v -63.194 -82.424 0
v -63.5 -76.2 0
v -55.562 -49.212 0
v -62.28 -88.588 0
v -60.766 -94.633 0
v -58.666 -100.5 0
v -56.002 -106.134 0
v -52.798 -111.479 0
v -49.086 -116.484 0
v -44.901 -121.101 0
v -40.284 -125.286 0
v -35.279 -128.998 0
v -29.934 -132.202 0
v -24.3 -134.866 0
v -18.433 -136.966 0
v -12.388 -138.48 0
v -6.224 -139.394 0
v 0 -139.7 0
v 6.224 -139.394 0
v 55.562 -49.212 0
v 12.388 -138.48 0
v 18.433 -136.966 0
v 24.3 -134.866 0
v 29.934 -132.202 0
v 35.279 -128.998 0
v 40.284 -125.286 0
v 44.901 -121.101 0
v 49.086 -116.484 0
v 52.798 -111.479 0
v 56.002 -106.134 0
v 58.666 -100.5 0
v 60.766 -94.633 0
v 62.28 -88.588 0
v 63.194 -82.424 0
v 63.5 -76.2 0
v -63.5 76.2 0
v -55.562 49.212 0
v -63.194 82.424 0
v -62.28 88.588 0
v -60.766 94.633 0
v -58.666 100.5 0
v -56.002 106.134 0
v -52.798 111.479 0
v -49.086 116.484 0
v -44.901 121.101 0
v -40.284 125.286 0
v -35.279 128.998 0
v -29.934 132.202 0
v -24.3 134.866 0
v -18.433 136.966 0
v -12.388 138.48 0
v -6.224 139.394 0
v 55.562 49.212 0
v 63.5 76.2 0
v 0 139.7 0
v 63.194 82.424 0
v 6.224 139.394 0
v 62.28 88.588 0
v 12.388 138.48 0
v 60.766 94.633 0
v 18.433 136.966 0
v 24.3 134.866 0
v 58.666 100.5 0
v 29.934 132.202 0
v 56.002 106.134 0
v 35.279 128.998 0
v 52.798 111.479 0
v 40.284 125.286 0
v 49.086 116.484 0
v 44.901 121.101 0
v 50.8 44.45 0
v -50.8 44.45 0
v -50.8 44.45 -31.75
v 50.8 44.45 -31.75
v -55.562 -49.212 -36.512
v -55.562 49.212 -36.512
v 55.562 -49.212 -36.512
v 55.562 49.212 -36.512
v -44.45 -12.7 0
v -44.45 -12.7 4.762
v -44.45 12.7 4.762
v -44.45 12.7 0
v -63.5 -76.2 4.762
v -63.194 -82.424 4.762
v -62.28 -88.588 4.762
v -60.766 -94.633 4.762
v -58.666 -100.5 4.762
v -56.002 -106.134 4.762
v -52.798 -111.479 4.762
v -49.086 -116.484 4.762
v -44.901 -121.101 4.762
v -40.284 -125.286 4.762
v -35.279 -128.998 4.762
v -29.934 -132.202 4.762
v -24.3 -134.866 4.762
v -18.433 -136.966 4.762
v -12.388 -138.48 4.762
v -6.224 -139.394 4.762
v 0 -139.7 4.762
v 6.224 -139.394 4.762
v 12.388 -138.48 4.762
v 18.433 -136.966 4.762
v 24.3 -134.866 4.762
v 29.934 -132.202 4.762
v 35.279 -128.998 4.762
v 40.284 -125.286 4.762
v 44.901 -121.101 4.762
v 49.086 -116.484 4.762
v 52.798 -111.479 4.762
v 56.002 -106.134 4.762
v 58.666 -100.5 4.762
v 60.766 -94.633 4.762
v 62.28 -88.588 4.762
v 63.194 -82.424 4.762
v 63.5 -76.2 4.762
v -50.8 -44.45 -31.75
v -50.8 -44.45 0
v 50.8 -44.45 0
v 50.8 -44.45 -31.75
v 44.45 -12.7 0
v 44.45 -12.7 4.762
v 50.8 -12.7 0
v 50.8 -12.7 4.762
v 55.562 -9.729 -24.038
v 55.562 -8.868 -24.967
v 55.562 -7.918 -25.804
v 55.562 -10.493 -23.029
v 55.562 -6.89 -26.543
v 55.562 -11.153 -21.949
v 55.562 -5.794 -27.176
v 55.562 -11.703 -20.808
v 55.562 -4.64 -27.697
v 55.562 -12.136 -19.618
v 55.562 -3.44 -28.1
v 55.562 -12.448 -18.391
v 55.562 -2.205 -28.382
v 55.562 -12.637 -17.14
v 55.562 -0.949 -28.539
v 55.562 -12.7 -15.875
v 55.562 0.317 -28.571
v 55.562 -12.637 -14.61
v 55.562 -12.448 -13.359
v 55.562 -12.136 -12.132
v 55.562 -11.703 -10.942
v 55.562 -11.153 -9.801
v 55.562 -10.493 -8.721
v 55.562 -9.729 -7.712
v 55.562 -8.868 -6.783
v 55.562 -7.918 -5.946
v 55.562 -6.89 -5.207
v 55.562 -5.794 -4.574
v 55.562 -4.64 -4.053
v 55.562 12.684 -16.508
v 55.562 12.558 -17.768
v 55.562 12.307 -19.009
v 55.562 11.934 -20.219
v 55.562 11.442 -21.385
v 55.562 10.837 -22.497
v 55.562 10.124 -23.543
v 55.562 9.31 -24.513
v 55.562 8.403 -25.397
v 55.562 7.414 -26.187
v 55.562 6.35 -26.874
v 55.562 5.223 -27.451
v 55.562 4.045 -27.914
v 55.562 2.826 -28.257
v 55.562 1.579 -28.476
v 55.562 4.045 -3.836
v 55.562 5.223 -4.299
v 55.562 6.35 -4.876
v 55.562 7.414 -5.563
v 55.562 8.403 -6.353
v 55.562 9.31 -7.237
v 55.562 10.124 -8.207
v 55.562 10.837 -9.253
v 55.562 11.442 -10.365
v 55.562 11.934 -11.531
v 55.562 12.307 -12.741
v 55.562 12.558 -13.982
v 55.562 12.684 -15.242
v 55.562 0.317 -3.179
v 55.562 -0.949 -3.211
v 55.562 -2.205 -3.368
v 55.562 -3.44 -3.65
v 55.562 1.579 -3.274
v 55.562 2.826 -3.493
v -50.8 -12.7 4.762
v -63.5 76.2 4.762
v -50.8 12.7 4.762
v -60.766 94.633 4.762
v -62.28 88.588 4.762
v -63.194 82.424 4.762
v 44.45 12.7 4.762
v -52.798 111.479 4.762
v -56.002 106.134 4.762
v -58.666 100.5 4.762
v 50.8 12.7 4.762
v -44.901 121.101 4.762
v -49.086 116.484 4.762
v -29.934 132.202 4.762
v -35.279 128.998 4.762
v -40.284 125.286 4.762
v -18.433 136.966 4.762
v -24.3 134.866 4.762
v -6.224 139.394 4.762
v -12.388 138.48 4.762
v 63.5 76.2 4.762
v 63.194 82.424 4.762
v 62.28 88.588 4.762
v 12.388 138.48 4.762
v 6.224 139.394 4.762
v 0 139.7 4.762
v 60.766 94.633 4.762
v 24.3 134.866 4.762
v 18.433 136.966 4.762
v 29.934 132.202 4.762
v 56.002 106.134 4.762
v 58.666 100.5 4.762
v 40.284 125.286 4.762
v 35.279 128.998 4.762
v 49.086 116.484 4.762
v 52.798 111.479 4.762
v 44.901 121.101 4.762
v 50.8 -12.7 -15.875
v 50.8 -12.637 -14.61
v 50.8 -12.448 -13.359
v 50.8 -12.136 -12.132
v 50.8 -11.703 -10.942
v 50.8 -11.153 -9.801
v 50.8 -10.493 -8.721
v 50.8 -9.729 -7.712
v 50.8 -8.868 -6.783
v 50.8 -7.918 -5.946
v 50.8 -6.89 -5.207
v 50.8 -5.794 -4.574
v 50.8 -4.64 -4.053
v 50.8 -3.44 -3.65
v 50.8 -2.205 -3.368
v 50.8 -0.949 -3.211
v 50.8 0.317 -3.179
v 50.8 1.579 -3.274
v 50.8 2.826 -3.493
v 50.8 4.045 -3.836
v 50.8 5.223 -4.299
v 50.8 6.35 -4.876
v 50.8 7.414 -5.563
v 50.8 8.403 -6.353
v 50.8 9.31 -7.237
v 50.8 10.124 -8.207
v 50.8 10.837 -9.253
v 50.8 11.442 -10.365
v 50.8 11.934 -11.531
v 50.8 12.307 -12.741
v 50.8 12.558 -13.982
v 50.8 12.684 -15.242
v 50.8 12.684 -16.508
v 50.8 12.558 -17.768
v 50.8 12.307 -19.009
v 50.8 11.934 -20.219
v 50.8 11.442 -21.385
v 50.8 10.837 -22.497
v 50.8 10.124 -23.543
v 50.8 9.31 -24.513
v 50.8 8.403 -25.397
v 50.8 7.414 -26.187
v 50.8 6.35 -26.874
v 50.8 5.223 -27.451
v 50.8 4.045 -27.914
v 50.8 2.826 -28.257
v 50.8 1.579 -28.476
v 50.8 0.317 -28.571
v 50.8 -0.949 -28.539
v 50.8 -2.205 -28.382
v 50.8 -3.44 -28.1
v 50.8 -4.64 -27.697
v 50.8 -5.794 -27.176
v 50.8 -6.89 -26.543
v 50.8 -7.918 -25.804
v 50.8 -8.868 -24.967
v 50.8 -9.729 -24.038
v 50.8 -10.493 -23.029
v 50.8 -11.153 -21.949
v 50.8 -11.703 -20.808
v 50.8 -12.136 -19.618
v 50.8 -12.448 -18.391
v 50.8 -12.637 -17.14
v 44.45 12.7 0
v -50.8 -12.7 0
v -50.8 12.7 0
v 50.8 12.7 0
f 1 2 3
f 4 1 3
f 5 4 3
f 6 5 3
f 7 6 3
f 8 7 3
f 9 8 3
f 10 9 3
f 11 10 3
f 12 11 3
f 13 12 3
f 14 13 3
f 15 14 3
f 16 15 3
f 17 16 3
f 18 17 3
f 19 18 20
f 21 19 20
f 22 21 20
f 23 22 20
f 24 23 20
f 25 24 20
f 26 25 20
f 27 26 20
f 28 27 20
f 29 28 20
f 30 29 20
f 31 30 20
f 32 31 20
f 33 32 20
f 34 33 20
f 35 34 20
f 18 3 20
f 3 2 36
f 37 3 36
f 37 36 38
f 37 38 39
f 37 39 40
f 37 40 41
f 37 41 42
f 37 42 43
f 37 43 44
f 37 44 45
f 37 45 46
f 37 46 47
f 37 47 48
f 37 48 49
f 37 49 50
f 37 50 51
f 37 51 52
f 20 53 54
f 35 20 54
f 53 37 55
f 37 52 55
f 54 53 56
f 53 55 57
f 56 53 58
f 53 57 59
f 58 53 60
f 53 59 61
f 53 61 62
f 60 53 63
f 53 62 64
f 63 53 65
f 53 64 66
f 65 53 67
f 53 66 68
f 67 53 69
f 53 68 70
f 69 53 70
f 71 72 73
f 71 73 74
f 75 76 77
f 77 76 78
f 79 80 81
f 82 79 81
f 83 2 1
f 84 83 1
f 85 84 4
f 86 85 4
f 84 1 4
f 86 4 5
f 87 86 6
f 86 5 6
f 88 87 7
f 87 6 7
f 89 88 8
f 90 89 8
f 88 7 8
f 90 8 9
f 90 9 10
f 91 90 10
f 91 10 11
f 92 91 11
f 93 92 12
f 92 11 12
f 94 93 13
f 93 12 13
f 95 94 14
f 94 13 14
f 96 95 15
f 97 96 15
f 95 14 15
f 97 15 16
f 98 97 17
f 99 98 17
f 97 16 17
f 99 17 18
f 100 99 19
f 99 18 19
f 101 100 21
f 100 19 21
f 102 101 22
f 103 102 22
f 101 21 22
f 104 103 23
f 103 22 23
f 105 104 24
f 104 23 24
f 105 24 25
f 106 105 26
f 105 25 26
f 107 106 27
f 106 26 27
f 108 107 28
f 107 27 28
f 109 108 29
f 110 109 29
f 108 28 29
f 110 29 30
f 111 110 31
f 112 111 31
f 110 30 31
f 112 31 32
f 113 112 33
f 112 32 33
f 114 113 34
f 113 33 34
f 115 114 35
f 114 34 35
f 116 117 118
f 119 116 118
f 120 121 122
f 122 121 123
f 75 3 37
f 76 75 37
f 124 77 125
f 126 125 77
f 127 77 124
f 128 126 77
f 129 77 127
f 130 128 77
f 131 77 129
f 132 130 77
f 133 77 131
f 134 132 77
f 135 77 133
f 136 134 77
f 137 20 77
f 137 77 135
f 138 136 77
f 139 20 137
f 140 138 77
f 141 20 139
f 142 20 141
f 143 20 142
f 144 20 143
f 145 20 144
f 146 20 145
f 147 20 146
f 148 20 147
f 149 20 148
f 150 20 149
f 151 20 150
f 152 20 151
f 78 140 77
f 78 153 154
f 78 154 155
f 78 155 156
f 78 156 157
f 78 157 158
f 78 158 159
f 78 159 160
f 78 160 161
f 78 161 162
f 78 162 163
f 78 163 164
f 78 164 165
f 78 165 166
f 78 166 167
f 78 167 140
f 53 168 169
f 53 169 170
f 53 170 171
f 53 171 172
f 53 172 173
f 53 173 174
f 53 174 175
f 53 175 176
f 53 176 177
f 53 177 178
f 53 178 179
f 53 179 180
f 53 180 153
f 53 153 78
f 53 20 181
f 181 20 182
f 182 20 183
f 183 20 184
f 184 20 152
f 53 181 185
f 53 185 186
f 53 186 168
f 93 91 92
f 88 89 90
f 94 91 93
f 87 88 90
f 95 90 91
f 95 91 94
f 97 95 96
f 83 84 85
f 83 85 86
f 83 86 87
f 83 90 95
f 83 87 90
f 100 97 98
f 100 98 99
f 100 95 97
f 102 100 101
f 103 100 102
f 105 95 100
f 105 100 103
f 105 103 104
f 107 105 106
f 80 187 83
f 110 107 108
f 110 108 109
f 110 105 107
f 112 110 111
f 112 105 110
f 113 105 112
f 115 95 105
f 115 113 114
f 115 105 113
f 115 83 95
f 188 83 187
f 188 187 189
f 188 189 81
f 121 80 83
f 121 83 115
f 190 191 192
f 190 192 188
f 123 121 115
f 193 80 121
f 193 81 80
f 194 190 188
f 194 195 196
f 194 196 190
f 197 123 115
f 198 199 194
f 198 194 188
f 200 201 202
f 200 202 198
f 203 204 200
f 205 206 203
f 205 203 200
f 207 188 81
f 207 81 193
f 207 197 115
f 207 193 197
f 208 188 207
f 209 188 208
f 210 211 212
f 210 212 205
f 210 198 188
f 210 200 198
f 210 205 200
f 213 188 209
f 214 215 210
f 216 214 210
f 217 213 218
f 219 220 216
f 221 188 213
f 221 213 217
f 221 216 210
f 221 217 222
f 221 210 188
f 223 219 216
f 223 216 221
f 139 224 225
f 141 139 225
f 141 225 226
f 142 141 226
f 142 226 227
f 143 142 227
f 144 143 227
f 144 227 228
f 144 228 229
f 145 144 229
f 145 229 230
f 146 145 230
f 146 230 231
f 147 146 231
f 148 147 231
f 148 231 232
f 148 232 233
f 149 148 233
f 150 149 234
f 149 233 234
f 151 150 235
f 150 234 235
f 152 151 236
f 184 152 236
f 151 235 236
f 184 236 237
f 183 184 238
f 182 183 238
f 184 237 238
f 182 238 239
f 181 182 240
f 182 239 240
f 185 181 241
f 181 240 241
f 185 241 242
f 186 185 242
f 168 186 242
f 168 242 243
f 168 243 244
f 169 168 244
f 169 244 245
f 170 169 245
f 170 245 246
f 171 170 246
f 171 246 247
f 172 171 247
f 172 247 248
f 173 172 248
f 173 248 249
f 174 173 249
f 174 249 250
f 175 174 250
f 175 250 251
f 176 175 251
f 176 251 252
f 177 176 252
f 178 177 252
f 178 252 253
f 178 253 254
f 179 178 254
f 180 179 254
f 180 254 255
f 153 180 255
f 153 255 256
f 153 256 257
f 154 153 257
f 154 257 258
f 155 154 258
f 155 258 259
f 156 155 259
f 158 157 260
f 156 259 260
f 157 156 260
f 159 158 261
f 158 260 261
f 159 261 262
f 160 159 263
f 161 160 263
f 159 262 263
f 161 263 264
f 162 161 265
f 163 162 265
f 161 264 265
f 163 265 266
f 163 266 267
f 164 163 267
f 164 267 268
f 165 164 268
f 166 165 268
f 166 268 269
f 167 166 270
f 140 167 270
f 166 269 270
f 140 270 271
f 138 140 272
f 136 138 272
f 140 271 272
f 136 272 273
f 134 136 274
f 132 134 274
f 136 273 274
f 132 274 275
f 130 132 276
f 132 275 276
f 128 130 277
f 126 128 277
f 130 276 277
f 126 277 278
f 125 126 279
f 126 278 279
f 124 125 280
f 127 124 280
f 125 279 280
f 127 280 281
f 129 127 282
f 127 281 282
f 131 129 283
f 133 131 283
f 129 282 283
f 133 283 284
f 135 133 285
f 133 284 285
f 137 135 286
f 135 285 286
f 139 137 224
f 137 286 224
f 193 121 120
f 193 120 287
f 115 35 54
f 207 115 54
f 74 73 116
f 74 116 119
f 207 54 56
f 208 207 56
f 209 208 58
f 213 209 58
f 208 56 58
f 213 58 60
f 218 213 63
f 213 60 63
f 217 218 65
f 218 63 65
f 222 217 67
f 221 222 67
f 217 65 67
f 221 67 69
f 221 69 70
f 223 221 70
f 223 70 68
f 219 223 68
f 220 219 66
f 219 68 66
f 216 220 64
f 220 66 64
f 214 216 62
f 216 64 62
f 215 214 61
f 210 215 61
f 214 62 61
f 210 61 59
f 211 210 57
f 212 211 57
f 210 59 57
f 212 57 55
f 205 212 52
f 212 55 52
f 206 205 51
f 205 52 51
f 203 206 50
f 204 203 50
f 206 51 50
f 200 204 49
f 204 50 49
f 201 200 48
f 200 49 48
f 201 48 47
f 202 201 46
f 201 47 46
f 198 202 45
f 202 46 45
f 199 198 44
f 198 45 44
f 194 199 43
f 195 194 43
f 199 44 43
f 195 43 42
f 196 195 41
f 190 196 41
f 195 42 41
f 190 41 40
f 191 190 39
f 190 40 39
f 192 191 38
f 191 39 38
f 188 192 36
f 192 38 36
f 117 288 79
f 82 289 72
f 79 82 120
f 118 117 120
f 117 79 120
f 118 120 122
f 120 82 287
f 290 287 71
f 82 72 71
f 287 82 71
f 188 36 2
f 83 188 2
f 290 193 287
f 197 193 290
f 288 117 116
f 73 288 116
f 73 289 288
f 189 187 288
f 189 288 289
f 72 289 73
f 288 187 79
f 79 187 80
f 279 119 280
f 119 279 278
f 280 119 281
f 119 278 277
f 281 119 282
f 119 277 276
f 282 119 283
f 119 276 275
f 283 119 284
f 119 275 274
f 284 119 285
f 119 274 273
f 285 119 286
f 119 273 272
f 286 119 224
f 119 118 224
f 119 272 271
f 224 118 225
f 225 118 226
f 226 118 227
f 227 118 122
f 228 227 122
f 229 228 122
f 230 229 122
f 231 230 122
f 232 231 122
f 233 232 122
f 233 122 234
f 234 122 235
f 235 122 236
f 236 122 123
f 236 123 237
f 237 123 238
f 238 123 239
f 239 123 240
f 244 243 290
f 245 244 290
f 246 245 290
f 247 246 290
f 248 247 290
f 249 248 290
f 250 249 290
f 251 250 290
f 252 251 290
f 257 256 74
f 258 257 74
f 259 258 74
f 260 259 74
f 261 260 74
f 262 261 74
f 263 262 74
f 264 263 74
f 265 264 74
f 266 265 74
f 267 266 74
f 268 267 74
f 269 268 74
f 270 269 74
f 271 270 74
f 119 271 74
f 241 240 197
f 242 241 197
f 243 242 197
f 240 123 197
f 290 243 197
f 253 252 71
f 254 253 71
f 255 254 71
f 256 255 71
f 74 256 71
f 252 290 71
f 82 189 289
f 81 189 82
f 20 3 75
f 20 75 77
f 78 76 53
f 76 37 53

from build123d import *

# Parameters (mm, degrees)
F1_DEPTH  = 4.7625
F2_W      = 111.125
F2_H      = 98.425
F2_W_2    = 101.6
F2_H_2    = 88.9
F3_DEPTH  = 31.75
F5_D      = 25.4
F5_DEPTH  = 50.8
F6_W      = 6.35
F6_H      = 25.4
F7_DEPTH  = 4.7625
F9_W      = 111.125
F9_H      = 98.425
F10_DEPTH = 4.7625


with BuildPart() as f1:
    # F0 (on Top) → F1 (new body)
    with BuildSketch(Plane.XY):
        with BuildLine():
            ThreePointArc((-63.5, -76.2), (0, -139.7), (63.5, -76.2))
            Line((63.5, -76.2), (63.5, 76.2))
            ThreePointArc((63.5, 76.2), (0, 139.7), (-63.5, 76.2))
            Line((-63.5, 76.2), (-63.5, -76.2))
        make_face()
    extrude(amount=F1_DEPTH)

    # F2 (on face) → F3 (join)
    with BuildSketch(Plane(origin=(0, 0, 0), x_dir=(1, 0, 0), z_dir=(0, 0, -1))):
        Rectangle(F2_W, F2_H)
        Rectangle(F2_W_2, F2_H_2, mode=Mode.SUBTRACT)
    extrude(amount=F3_DEPTH)

    # F5
    with Locations(Plane.YZ.offset(55.5625)):
        with Locations((0, -15.875)):
            Hole(F5_D / 2, depth=F5_DEPTH)

    # F6 (on face) → F7 (cut)
    with BuildSketch(Plane.XY.offset(4.7625)):
        with Locations((47.625, 0)):
            Rectangle(F6_W, F6_H)
        with Locations((-47.625, 0)):
            Rectangle(F6_W, F6_H)
    extrude(amount=-F7_DEPTH, mode=Mode.SUBTRACT)

    # F9 (on offset) → F10 (join)
    with BuildSketch(Plane.XY.offset(-31.75)):
        Rectangle(F9_W, F9_H)
    extrude(amount=-F10_DEPTH)


solid = f1.part
